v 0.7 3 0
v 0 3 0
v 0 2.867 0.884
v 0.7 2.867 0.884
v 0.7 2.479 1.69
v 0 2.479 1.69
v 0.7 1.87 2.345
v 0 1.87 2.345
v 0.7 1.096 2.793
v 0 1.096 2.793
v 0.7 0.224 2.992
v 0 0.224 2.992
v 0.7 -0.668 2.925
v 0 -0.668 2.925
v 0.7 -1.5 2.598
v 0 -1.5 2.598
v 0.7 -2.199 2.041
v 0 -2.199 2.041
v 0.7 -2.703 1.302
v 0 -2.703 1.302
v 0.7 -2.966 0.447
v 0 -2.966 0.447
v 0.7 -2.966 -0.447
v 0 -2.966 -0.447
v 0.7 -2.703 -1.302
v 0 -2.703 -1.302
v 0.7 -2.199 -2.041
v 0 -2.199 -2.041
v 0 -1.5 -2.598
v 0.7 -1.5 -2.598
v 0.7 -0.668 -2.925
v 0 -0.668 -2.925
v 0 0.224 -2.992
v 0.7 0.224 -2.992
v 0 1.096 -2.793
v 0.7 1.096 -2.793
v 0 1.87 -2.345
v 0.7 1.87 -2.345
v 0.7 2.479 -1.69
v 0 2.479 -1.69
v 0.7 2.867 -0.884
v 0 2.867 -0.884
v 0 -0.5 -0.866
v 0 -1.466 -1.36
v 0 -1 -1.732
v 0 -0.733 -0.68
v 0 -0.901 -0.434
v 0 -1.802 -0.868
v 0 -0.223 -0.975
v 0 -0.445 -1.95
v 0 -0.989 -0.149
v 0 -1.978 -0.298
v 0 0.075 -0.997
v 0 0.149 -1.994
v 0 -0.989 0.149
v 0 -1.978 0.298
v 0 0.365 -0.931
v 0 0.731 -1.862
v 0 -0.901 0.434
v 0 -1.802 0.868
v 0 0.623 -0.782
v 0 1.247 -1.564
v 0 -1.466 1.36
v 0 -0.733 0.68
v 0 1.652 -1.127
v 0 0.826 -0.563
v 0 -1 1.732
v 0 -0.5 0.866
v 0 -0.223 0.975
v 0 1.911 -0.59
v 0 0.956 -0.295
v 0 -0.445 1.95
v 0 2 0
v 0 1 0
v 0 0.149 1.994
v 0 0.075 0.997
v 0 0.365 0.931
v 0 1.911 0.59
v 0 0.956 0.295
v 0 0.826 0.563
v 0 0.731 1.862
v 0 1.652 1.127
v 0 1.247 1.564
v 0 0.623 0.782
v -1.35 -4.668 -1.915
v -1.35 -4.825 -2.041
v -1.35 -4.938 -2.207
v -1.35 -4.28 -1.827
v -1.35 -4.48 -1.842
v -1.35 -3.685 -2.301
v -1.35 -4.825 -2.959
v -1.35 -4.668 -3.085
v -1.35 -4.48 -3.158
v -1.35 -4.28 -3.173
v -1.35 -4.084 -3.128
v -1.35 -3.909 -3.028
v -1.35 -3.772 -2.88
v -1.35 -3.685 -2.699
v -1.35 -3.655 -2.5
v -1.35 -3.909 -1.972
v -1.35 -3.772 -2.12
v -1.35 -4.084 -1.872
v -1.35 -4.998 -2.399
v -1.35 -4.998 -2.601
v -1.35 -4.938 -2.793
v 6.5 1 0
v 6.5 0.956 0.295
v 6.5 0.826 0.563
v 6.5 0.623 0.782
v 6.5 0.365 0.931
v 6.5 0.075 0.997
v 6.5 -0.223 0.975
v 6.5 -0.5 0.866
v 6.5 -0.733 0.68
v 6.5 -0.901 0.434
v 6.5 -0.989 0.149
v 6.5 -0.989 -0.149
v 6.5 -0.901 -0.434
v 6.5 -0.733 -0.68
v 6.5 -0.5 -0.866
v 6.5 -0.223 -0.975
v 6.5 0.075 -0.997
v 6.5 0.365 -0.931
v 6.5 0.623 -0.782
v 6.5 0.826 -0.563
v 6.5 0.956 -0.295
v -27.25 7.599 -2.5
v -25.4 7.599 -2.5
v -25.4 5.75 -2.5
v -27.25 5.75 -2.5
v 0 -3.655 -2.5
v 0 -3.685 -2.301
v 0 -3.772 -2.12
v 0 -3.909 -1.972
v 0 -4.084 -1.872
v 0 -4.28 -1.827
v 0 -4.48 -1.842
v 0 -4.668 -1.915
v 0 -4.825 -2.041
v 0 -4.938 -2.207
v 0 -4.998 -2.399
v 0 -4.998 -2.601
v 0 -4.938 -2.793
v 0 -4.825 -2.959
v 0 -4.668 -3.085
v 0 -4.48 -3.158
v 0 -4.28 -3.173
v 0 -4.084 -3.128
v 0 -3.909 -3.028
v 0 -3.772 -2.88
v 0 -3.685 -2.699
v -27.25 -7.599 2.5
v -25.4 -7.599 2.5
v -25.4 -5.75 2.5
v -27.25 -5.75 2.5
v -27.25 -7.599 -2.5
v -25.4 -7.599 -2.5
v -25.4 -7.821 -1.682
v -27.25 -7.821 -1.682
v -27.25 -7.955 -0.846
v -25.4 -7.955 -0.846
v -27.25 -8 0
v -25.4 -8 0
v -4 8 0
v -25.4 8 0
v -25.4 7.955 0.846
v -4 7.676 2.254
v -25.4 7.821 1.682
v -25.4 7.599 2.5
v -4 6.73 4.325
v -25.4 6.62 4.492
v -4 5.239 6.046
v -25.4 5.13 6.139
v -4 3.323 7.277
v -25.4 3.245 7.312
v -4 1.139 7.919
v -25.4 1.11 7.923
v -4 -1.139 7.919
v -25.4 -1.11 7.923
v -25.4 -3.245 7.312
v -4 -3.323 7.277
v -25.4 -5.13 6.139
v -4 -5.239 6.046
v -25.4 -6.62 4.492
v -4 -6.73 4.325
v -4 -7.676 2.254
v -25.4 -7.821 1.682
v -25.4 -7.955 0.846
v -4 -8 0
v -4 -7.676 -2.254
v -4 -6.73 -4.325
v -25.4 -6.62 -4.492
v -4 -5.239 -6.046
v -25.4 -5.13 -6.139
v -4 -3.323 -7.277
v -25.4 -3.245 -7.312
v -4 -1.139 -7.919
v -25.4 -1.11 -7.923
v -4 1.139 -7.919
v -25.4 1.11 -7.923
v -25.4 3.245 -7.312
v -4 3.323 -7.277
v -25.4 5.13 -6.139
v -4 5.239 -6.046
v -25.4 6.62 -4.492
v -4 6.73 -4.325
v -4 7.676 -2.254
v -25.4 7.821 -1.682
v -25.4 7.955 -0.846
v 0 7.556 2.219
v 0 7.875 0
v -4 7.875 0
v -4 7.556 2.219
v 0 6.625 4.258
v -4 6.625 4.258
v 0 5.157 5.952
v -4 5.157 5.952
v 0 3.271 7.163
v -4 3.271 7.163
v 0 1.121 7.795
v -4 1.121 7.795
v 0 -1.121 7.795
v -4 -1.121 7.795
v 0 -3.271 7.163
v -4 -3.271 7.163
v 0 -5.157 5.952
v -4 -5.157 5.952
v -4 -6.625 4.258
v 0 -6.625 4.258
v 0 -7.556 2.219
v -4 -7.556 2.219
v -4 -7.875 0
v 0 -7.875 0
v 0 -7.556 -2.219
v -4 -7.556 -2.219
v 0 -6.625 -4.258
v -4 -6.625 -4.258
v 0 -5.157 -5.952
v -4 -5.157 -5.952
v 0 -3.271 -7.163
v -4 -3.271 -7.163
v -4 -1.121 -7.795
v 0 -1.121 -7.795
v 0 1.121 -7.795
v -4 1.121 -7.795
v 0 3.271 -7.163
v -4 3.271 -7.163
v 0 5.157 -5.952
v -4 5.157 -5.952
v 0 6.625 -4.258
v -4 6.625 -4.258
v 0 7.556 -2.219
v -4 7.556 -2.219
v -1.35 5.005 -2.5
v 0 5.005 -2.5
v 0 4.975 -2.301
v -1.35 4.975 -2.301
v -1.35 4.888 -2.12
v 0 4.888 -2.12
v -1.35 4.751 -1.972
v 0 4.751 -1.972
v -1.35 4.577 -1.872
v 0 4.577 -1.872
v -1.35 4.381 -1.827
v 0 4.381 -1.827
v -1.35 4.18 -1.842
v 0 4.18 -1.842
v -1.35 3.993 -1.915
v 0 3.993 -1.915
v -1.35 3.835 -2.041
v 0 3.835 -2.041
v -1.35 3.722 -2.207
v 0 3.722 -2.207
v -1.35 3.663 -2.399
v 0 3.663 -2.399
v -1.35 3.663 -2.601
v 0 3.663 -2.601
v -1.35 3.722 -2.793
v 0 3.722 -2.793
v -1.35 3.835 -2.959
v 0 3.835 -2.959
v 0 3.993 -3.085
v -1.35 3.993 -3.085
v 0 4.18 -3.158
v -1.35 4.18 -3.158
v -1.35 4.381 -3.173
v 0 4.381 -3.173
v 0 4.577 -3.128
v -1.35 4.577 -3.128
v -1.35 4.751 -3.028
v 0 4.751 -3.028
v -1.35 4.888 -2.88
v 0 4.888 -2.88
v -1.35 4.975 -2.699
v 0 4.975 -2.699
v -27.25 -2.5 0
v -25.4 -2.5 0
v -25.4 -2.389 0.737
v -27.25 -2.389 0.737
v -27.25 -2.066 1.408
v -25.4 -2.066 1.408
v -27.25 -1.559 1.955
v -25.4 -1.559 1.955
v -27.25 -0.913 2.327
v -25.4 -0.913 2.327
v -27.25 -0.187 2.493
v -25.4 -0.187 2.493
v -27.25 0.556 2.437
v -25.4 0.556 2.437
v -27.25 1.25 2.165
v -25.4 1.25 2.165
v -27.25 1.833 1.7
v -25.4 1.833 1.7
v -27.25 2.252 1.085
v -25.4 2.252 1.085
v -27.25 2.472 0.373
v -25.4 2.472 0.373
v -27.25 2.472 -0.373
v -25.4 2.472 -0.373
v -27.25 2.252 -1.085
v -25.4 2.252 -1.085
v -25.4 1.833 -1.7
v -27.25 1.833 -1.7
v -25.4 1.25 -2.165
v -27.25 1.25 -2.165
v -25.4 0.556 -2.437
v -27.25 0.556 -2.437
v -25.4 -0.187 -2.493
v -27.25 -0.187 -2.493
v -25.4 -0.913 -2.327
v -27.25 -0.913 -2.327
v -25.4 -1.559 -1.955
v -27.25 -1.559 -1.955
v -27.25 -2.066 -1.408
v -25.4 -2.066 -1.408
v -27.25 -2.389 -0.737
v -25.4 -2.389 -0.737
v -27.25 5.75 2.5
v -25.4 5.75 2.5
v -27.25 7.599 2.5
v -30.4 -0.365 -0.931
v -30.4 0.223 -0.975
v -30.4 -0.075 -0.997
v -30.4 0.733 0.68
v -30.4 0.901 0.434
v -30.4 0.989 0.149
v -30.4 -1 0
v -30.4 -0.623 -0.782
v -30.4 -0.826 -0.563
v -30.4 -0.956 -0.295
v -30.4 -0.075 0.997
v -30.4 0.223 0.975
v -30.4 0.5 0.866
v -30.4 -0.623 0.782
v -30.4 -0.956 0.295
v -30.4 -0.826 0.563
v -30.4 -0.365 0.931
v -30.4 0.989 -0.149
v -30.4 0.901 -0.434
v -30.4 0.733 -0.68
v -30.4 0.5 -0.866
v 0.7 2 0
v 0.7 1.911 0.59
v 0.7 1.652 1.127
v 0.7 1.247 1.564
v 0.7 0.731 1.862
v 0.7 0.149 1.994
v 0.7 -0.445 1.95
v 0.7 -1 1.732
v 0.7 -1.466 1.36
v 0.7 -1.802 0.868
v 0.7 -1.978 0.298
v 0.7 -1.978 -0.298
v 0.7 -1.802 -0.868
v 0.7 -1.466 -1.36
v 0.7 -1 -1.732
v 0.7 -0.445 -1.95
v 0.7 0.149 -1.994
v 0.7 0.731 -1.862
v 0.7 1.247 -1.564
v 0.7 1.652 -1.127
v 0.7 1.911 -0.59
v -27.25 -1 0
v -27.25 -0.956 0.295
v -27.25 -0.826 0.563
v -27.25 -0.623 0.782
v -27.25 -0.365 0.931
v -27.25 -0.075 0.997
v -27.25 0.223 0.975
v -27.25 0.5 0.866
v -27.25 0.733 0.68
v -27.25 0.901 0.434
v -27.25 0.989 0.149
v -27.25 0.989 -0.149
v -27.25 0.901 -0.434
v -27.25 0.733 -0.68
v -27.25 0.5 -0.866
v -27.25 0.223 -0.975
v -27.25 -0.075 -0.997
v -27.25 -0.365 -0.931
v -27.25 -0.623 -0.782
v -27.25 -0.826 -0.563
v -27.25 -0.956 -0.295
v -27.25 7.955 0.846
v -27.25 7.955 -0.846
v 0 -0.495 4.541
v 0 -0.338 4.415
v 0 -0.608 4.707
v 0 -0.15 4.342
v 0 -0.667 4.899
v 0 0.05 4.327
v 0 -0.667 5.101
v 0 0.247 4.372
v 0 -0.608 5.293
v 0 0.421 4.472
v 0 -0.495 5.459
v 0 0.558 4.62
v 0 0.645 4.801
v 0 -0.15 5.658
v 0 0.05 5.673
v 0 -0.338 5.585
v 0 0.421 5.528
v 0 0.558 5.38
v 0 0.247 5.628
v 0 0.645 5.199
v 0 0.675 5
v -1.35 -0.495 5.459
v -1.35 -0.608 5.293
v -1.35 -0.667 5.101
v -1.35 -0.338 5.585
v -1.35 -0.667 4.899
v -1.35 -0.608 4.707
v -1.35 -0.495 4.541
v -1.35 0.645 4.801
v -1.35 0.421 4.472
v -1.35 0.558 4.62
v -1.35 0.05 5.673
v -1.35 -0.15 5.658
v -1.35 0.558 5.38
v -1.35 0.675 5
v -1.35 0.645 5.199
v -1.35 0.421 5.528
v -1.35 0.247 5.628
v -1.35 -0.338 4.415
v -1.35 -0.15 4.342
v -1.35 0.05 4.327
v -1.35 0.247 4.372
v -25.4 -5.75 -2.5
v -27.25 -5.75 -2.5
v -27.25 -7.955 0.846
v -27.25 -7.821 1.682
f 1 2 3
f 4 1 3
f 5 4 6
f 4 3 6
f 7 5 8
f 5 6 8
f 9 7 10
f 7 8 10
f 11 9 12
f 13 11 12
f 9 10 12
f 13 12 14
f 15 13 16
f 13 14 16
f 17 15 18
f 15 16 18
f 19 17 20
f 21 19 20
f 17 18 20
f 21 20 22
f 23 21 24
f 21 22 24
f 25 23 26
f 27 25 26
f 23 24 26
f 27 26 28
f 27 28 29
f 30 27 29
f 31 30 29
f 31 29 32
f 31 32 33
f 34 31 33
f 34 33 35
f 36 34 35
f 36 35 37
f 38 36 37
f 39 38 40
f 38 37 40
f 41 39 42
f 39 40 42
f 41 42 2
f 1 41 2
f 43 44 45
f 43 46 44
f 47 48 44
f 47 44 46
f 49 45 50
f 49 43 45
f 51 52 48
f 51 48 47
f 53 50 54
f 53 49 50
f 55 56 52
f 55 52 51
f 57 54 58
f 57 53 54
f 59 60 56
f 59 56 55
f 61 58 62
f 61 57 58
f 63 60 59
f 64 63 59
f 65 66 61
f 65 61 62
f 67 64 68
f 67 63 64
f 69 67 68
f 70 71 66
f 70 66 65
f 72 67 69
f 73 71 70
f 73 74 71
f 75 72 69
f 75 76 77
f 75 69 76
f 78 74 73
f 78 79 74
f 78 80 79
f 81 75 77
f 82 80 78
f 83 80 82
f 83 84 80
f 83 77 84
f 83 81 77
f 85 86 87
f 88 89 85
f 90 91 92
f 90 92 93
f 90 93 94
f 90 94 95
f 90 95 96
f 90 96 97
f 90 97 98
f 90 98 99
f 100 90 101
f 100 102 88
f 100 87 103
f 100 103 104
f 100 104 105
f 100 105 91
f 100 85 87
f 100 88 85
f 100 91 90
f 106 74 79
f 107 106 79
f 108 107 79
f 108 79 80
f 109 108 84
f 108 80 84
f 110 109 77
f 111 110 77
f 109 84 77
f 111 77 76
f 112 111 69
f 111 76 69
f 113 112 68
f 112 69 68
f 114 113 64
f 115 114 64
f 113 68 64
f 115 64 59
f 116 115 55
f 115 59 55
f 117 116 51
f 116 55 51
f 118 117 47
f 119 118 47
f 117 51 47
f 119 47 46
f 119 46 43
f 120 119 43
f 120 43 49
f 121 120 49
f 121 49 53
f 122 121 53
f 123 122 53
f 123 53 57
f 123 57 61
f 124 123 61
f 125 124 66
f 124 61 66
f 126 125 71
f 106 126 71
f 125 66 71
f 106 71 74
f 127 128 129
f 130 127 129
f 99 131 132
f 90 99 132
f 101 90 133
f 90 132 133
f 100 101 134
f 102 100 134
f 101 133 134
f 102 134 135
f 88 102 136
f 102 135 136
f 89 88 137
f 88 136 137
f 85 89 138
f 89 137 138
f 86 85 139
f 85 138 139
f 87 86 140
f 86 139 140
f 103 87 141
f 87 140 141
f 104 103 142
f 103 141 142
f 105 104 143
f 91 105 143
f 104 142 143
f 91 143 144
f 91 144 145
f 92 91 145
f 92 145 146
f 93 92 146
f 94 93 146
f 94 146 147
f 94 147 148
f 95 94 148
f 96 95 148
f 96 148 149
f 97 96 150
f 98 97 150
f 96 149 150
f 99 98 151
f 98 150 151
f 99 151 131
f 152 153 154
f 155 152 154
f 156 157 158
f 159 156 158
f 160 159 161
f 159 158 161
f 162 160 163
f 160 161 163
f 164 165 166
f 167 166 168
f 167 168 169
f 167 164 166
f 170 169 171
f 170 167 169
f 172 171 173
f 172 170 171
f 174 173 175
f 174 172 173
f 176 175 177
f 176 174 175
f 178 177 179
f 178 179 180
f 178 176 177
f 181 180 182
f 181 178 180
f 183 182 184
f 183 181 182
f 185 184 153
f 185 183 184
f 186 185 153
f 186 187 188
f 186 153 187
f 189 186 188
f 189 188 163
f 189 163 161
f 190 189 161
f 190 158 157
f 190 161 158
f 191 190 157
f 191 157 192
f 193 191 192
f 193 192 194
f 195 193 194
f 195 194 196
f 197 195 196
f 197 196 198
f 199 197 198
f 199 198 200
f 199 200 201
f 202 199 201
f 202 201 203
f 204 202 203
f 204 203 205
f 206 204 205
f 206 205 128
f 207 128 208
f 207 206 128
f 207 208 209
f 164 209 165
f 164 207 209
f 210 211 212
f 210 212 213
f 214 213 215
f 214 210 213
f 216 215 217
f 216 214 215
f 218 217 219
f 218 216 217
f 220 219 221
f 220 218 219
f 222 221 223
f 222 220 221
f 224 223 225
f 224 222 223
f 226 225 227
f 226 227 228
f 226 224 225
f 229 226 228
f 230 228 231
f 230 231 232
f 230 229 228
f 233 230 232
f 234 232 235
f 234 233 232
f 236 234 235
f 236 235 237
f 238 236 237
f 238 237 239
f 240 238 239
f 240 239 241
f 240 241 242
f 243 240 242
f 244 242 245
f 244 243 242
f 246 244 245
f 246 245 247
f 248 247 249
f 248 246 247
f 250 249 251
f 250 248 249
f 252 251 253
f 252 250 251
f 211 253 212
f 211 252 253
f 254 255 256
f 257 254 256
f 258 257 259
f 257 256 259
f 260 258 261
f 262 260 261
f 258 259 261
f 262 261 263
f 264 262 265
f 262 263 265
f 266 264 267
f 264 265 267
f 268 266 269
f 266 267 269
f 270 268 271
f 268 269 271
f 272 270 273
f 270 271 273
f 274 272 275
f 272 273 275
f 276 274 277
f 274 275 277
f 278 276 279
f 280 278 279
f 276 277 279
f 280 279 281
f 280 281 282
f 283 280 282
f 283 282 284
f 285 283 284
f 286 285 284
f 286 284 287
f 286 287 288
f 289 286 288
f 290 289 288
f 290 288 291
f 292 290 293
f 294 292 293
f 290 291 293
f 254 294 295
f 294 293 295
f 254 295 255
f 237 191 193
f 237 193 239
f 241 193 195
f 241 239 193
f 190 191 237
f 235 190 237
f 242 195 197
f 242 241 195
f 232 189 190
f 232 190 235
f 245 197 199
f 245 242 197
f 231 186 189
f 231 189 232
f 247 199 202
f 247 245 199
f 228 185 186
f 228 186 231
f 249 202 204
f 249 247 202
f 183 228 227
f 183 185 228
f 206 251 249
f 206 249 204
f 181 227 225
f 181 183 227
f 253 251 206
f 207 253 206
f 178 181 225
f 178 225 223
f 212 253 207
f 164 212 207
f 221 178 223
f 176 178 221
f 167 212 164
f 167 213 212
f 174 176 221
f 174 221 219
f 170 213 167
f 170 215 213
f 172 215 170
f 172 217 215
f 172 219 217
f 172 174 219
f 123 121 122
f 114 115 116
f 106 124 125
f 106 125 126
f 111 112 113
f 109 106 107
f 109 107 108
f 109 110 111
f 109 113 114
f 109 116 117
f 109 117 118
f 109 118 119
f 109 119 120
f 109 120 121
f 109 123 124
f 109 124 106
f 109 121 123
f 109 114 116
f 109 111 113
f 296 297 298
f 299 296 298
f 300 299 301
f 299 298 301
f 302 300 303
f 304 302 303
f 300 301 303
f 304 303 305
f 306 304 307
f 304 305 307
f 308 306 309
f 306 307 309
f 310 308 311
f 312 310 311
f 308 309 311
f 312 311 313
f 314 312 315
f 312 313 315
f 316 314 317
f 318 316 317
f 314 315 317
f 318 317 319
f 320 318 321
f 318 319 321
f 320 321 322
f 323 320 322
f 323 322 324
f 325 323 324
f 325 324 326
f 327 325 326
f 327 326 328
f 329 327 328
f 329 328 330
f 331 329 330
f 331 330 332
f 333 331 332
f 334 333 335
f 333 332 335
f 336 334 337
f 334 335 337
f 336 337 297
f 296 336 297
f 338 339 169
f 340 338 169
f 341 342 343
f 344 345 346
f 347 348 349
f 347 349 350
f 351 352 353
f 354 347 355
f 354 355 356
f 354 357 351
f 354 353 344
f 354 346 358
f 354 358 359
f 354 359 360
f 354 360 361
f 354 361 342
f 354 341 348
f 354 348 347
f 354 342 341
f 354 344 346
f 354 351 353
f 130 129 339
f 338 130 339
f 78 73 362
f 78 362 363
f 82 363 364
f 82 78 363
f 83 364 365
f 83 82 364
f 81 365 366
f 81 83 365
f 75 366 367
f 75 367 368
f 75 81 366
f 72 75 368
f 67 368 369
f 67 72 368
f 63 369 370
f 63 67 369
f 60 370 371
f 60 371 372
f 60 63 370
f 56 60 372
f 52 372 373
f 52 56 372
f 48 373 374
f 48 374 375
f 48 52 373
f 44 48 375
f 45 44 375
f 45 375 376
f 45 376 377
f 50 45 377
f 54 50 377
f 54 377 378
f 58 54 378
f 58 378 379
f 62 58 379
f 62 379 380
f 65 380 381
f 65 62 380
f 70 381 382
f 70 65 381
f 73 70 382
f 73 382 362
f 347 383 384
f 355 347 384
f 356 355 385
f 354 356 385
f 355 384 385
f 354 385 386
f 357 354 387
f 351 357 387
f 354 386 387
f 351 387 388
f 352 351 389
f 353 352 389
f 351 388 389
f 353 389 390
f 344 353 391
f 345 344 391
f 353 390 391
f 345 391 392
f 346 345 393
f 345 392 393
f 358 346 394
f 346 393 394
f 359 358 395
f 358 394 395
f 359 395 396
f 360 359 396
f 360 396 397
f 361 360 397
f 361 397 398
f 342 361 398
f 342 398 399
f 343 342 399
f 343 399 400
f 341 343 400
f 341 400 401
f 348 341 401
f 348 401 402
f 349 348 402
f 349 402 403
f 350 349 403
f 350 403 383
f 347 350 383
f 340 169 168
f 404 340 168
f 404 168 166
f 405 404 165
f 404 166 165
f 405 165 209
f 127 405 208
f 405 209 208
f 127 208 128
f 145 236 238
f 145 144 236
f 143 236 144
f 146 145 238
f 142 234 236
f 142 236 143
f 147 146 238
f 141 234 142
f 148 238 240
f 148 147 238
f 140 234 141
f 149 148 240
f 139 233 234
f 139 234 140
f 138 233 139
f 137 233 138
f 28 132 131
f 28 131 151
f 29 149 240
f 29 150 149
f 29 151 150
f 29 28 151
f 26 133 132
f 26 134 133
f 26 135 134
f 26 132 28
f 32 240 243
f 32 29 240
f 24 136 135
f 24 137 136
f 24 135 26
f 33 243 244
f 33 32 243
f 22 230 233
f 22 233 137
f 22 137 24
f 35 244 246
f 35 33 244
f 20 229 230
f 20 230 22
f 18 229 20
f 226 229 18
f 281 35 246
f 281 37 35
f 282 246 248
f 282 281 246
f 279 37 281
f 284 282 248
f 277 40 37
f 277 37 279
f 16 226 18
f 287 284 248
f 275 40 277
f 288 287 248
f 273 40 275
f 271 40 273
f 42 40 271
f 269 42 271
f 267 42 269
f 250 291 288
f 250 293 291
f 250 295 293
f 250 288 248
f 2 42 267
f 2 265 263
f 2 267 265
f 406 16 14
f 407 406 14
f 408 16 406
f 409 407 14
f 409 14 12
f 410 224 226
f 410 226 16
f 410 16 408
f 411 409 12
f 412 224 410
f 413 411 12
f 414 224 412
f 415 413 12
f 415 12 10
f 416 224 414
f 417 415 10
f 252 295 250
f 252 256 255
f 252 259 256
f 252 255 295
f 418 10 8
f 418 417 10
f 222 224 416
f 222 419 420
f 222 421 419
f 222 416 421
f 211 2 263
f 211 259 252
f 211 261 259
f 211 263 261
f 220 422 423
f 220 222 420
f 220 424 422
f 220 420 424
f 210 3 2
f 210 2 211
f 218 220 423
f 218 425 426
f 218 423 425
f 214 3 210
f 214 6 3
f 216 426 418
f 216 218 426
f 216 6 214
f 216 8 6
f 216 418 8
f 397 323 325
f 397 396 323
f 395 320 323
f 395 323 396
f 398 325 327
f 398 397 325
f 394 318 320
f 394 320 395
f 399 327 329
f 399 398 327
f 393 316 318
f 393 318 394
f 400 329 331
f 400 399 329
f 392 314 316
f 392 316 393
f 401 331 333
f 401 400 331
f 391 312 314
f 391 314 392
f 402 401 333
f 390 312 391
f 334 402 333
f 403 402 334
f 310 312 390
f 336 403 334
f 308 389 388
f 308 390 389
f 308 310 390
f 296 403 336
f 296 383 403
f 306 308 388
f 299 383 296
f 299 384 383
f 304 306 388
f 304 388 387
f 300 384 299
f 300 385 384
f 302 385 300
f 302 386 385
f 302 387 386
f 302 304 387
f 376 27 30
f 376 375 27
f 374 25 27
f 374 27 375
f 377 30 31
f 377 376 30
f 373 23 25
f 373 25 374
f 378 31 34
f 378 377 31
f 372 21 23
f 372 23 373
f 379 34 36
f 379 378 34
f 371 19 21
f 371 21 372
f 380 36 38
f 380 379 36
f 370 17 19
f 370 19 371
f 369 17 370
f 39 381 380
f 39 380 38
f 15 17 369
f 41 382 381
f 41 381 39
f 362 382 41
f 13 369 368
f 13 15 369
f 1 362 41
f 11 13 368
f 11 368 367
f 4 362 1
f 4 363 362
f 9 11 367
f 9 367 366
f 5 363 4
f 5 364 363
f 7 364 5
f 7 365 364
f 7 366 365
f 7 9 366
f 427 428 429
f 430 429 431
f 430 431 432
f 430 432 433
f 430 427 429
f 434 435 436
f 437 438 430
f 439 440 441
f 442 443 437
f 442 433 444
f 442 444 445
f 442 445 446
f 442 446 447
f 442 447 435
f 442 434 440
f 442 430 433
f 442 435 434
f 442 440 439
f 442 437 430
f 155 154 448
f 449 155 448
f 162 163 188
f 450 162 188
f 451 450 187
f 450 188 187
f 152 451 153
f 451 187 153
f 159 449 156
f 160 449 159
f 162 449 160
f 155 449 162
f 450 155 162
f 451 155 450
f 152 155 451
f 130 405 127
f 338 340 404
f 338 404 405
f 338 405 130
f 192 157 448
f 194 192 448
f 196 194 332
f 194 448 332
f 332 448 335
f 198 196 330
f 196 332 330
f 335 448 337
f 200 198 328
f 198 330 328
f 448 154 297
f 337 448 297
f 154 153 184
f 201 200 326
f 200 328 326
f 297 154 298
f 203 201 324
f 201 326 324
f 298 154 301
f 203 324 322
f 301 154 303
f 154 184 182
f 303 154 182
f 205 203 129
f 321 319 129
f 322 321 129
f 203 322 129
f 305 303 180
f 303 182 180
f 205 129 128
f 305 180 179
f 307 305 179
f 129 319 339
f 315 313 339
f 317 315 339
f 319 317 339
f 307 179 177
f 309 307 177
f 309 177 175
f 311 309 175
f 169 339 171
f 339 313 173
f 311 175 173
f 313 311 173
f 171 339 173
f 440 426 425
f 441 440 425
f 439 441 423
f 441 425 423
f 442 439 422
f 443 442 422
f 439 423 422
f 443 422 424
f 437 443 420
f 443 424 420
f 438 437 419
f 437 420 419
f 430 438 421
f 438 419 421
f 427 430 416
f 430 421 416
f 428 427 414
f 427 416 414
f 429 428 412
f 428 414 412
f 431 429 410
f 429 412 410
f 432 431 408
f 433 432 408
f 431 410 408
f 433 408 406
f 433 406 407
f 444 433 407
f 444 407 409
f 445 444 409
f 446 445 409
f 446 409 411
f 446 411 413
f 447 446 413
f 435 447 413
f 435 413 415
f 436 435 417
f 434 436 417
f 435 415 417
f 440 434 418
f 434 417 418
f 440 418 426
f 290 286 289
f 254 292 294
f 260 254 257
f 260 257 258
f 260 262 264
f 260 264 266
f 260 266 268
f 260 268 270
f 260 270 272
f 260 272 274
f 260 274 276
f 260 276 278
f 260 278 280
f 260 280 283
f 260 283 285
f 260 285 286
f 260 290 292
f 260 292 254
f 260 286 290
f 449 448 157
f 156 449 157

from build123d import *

# Parameters (mm, degrees)
F0_R     = 8
F0_R_2   = 7.875
F0_R_3   = 0.675
F0_R_4   = 3
F0_R_5   = 2
F0_R_6   = 1
F1_DEPTH = 25.4
F2_DEPTH = 6.5
F3_DEPTH = 0.7
F4_DEPTH = 1.35
F5_DEPTH = 4
F6_R     = 1
F7_DEPTH = 5
F6_R_2   = 2.5
F8_DEPTH = 1.85


# Not quite as in the source:
# - after a boolean that leaves OpenCascade's solid faulty, fix() repairs it


with BuildPart() as f1:
    # F0 (on Right) → F1 (new body)
    with BuildSketch(Plane.YZ):
        Circle(F0_R)
        Circle(F0_R_2, mode=Mode.SUBTRACT)
        Circle(F0_R_2)
        with Locations((-4.3301270189, -2.5)):
            Circle(F0_R_3, mode=Mode.SUBTRACT)
        with Locations((4.3301270189, -2.5)):
            Circle(F0_R_3, mode=Mode.SUBTRACT)
        Circle(F0_R_4, mode=Mode.SUBTRACT)
        with Locations((0, 5)):
            Circle(F0_R_3, mode=Mode.SUBTRACT)
        Circle(F0_R_4)
        Circle(F0_R_5, mode=Mode.SUBTRACT)
        Circle(F0_R_5)
        Circle(F0_R_6, mode=Mode.SUBTRACT)
        Circle(F0_R_6)
        with Locations((0, 5)):
            Circle(F0_R_3)
        with Locations((4.3301270189, -2.5)):
            Circle(F0_R_3)
        with Locations((-4.3301270189, -2.5)):
            Circle(F0_R_3)
    extrude(amount=-F1_DEPTH)

    # F0 (on Right) → F2 (join)
    with BuildSketch(Plane.YZ):
        Circle(F0_R_6)
    extrude(amount=F2_DEPTH)

    # F0 (on Right) → F3 (join)
    with BuildSketch(Plane.YZ):
        Circle(F0_R_4)
        Circle(F0_R_5, mode=Mode.SUBTRACT)
    extrude(amount=F3_DEPTH)

    # F0 (on Right) → F4 (cut)
    with BuildSketch(Plane.YZ):
        with Locations((0, 5)):
            Circle(F0_R_3)
        with Locations((4.3301270189, -2.5)):
            Circle(F0_R_3)
        with Locations((-4.3301270189, -2.5)):
            Circle(F0_R_3)
    extrude(amount=-F4_DEPTH, mode=Mode.SUBTRACT)

    # F0 (on Right) → F5 (cut)
    with BuildSketch(Plane.YZ):
        Circle(F0_R)
        Circle(F0_R_2, mode=Mode.SUBTRACT)
    extrude(amount=-F5_DEPTH, mode=Mode.SUBTRACT)

    # F6 (on face) → F7 (join)
    with BuildSketch(Plane(origin=(-25.4, 0, 0), x_dir=(0, -1, 0), z_dir=(-1, 0, 0))):
        Circle(F6_R)
    extrude(amount=F7_DEPTH)

    # F6 (on face) → F8 (join)
    with BuildSketch(Plane(origin=(-25.4, 0, 0), x_dir=(0, -1, 0), z_dir=(-1, 0, 0))):
        Circle(F6_R_2)
        Circle(F6_R, mode=Mode.SUBTRACT)
        with BuildLine():
            ThreePointArc((8, 0), (7.8992004853, 1.2659509046), (7.5993420768, 2.5))
            Line((7.5993420768, 2.5), (5.75, 2.5))
            Line((5.75, 2.5), (5.75, -2.5))
            Line((5.75, -2.5), (7.5993420768, -2.5))
            ThreePointArc((7.5993420768, -2.5), (7.8992004853, -1.2659509046), (8, 0))
        make_face()
        with BuildLine():
            Line((-5.75, 2.5), (-7.5993420768, 2.5))
            ThreePointArc((-7.5993420768, 2.5), (-8, 0), (-7.5993420768, -2.5))
            Line((-7.5993420768, -2.5), (-5.75, -2.5))
            Line((-5.75, -2.5), (-5.75, 2.5))
        make_face()
    extrude(amount=F8_DEPTH)

    add(f1.part.fix(), mode=Mode.REPLACE)


solid = f1.part
